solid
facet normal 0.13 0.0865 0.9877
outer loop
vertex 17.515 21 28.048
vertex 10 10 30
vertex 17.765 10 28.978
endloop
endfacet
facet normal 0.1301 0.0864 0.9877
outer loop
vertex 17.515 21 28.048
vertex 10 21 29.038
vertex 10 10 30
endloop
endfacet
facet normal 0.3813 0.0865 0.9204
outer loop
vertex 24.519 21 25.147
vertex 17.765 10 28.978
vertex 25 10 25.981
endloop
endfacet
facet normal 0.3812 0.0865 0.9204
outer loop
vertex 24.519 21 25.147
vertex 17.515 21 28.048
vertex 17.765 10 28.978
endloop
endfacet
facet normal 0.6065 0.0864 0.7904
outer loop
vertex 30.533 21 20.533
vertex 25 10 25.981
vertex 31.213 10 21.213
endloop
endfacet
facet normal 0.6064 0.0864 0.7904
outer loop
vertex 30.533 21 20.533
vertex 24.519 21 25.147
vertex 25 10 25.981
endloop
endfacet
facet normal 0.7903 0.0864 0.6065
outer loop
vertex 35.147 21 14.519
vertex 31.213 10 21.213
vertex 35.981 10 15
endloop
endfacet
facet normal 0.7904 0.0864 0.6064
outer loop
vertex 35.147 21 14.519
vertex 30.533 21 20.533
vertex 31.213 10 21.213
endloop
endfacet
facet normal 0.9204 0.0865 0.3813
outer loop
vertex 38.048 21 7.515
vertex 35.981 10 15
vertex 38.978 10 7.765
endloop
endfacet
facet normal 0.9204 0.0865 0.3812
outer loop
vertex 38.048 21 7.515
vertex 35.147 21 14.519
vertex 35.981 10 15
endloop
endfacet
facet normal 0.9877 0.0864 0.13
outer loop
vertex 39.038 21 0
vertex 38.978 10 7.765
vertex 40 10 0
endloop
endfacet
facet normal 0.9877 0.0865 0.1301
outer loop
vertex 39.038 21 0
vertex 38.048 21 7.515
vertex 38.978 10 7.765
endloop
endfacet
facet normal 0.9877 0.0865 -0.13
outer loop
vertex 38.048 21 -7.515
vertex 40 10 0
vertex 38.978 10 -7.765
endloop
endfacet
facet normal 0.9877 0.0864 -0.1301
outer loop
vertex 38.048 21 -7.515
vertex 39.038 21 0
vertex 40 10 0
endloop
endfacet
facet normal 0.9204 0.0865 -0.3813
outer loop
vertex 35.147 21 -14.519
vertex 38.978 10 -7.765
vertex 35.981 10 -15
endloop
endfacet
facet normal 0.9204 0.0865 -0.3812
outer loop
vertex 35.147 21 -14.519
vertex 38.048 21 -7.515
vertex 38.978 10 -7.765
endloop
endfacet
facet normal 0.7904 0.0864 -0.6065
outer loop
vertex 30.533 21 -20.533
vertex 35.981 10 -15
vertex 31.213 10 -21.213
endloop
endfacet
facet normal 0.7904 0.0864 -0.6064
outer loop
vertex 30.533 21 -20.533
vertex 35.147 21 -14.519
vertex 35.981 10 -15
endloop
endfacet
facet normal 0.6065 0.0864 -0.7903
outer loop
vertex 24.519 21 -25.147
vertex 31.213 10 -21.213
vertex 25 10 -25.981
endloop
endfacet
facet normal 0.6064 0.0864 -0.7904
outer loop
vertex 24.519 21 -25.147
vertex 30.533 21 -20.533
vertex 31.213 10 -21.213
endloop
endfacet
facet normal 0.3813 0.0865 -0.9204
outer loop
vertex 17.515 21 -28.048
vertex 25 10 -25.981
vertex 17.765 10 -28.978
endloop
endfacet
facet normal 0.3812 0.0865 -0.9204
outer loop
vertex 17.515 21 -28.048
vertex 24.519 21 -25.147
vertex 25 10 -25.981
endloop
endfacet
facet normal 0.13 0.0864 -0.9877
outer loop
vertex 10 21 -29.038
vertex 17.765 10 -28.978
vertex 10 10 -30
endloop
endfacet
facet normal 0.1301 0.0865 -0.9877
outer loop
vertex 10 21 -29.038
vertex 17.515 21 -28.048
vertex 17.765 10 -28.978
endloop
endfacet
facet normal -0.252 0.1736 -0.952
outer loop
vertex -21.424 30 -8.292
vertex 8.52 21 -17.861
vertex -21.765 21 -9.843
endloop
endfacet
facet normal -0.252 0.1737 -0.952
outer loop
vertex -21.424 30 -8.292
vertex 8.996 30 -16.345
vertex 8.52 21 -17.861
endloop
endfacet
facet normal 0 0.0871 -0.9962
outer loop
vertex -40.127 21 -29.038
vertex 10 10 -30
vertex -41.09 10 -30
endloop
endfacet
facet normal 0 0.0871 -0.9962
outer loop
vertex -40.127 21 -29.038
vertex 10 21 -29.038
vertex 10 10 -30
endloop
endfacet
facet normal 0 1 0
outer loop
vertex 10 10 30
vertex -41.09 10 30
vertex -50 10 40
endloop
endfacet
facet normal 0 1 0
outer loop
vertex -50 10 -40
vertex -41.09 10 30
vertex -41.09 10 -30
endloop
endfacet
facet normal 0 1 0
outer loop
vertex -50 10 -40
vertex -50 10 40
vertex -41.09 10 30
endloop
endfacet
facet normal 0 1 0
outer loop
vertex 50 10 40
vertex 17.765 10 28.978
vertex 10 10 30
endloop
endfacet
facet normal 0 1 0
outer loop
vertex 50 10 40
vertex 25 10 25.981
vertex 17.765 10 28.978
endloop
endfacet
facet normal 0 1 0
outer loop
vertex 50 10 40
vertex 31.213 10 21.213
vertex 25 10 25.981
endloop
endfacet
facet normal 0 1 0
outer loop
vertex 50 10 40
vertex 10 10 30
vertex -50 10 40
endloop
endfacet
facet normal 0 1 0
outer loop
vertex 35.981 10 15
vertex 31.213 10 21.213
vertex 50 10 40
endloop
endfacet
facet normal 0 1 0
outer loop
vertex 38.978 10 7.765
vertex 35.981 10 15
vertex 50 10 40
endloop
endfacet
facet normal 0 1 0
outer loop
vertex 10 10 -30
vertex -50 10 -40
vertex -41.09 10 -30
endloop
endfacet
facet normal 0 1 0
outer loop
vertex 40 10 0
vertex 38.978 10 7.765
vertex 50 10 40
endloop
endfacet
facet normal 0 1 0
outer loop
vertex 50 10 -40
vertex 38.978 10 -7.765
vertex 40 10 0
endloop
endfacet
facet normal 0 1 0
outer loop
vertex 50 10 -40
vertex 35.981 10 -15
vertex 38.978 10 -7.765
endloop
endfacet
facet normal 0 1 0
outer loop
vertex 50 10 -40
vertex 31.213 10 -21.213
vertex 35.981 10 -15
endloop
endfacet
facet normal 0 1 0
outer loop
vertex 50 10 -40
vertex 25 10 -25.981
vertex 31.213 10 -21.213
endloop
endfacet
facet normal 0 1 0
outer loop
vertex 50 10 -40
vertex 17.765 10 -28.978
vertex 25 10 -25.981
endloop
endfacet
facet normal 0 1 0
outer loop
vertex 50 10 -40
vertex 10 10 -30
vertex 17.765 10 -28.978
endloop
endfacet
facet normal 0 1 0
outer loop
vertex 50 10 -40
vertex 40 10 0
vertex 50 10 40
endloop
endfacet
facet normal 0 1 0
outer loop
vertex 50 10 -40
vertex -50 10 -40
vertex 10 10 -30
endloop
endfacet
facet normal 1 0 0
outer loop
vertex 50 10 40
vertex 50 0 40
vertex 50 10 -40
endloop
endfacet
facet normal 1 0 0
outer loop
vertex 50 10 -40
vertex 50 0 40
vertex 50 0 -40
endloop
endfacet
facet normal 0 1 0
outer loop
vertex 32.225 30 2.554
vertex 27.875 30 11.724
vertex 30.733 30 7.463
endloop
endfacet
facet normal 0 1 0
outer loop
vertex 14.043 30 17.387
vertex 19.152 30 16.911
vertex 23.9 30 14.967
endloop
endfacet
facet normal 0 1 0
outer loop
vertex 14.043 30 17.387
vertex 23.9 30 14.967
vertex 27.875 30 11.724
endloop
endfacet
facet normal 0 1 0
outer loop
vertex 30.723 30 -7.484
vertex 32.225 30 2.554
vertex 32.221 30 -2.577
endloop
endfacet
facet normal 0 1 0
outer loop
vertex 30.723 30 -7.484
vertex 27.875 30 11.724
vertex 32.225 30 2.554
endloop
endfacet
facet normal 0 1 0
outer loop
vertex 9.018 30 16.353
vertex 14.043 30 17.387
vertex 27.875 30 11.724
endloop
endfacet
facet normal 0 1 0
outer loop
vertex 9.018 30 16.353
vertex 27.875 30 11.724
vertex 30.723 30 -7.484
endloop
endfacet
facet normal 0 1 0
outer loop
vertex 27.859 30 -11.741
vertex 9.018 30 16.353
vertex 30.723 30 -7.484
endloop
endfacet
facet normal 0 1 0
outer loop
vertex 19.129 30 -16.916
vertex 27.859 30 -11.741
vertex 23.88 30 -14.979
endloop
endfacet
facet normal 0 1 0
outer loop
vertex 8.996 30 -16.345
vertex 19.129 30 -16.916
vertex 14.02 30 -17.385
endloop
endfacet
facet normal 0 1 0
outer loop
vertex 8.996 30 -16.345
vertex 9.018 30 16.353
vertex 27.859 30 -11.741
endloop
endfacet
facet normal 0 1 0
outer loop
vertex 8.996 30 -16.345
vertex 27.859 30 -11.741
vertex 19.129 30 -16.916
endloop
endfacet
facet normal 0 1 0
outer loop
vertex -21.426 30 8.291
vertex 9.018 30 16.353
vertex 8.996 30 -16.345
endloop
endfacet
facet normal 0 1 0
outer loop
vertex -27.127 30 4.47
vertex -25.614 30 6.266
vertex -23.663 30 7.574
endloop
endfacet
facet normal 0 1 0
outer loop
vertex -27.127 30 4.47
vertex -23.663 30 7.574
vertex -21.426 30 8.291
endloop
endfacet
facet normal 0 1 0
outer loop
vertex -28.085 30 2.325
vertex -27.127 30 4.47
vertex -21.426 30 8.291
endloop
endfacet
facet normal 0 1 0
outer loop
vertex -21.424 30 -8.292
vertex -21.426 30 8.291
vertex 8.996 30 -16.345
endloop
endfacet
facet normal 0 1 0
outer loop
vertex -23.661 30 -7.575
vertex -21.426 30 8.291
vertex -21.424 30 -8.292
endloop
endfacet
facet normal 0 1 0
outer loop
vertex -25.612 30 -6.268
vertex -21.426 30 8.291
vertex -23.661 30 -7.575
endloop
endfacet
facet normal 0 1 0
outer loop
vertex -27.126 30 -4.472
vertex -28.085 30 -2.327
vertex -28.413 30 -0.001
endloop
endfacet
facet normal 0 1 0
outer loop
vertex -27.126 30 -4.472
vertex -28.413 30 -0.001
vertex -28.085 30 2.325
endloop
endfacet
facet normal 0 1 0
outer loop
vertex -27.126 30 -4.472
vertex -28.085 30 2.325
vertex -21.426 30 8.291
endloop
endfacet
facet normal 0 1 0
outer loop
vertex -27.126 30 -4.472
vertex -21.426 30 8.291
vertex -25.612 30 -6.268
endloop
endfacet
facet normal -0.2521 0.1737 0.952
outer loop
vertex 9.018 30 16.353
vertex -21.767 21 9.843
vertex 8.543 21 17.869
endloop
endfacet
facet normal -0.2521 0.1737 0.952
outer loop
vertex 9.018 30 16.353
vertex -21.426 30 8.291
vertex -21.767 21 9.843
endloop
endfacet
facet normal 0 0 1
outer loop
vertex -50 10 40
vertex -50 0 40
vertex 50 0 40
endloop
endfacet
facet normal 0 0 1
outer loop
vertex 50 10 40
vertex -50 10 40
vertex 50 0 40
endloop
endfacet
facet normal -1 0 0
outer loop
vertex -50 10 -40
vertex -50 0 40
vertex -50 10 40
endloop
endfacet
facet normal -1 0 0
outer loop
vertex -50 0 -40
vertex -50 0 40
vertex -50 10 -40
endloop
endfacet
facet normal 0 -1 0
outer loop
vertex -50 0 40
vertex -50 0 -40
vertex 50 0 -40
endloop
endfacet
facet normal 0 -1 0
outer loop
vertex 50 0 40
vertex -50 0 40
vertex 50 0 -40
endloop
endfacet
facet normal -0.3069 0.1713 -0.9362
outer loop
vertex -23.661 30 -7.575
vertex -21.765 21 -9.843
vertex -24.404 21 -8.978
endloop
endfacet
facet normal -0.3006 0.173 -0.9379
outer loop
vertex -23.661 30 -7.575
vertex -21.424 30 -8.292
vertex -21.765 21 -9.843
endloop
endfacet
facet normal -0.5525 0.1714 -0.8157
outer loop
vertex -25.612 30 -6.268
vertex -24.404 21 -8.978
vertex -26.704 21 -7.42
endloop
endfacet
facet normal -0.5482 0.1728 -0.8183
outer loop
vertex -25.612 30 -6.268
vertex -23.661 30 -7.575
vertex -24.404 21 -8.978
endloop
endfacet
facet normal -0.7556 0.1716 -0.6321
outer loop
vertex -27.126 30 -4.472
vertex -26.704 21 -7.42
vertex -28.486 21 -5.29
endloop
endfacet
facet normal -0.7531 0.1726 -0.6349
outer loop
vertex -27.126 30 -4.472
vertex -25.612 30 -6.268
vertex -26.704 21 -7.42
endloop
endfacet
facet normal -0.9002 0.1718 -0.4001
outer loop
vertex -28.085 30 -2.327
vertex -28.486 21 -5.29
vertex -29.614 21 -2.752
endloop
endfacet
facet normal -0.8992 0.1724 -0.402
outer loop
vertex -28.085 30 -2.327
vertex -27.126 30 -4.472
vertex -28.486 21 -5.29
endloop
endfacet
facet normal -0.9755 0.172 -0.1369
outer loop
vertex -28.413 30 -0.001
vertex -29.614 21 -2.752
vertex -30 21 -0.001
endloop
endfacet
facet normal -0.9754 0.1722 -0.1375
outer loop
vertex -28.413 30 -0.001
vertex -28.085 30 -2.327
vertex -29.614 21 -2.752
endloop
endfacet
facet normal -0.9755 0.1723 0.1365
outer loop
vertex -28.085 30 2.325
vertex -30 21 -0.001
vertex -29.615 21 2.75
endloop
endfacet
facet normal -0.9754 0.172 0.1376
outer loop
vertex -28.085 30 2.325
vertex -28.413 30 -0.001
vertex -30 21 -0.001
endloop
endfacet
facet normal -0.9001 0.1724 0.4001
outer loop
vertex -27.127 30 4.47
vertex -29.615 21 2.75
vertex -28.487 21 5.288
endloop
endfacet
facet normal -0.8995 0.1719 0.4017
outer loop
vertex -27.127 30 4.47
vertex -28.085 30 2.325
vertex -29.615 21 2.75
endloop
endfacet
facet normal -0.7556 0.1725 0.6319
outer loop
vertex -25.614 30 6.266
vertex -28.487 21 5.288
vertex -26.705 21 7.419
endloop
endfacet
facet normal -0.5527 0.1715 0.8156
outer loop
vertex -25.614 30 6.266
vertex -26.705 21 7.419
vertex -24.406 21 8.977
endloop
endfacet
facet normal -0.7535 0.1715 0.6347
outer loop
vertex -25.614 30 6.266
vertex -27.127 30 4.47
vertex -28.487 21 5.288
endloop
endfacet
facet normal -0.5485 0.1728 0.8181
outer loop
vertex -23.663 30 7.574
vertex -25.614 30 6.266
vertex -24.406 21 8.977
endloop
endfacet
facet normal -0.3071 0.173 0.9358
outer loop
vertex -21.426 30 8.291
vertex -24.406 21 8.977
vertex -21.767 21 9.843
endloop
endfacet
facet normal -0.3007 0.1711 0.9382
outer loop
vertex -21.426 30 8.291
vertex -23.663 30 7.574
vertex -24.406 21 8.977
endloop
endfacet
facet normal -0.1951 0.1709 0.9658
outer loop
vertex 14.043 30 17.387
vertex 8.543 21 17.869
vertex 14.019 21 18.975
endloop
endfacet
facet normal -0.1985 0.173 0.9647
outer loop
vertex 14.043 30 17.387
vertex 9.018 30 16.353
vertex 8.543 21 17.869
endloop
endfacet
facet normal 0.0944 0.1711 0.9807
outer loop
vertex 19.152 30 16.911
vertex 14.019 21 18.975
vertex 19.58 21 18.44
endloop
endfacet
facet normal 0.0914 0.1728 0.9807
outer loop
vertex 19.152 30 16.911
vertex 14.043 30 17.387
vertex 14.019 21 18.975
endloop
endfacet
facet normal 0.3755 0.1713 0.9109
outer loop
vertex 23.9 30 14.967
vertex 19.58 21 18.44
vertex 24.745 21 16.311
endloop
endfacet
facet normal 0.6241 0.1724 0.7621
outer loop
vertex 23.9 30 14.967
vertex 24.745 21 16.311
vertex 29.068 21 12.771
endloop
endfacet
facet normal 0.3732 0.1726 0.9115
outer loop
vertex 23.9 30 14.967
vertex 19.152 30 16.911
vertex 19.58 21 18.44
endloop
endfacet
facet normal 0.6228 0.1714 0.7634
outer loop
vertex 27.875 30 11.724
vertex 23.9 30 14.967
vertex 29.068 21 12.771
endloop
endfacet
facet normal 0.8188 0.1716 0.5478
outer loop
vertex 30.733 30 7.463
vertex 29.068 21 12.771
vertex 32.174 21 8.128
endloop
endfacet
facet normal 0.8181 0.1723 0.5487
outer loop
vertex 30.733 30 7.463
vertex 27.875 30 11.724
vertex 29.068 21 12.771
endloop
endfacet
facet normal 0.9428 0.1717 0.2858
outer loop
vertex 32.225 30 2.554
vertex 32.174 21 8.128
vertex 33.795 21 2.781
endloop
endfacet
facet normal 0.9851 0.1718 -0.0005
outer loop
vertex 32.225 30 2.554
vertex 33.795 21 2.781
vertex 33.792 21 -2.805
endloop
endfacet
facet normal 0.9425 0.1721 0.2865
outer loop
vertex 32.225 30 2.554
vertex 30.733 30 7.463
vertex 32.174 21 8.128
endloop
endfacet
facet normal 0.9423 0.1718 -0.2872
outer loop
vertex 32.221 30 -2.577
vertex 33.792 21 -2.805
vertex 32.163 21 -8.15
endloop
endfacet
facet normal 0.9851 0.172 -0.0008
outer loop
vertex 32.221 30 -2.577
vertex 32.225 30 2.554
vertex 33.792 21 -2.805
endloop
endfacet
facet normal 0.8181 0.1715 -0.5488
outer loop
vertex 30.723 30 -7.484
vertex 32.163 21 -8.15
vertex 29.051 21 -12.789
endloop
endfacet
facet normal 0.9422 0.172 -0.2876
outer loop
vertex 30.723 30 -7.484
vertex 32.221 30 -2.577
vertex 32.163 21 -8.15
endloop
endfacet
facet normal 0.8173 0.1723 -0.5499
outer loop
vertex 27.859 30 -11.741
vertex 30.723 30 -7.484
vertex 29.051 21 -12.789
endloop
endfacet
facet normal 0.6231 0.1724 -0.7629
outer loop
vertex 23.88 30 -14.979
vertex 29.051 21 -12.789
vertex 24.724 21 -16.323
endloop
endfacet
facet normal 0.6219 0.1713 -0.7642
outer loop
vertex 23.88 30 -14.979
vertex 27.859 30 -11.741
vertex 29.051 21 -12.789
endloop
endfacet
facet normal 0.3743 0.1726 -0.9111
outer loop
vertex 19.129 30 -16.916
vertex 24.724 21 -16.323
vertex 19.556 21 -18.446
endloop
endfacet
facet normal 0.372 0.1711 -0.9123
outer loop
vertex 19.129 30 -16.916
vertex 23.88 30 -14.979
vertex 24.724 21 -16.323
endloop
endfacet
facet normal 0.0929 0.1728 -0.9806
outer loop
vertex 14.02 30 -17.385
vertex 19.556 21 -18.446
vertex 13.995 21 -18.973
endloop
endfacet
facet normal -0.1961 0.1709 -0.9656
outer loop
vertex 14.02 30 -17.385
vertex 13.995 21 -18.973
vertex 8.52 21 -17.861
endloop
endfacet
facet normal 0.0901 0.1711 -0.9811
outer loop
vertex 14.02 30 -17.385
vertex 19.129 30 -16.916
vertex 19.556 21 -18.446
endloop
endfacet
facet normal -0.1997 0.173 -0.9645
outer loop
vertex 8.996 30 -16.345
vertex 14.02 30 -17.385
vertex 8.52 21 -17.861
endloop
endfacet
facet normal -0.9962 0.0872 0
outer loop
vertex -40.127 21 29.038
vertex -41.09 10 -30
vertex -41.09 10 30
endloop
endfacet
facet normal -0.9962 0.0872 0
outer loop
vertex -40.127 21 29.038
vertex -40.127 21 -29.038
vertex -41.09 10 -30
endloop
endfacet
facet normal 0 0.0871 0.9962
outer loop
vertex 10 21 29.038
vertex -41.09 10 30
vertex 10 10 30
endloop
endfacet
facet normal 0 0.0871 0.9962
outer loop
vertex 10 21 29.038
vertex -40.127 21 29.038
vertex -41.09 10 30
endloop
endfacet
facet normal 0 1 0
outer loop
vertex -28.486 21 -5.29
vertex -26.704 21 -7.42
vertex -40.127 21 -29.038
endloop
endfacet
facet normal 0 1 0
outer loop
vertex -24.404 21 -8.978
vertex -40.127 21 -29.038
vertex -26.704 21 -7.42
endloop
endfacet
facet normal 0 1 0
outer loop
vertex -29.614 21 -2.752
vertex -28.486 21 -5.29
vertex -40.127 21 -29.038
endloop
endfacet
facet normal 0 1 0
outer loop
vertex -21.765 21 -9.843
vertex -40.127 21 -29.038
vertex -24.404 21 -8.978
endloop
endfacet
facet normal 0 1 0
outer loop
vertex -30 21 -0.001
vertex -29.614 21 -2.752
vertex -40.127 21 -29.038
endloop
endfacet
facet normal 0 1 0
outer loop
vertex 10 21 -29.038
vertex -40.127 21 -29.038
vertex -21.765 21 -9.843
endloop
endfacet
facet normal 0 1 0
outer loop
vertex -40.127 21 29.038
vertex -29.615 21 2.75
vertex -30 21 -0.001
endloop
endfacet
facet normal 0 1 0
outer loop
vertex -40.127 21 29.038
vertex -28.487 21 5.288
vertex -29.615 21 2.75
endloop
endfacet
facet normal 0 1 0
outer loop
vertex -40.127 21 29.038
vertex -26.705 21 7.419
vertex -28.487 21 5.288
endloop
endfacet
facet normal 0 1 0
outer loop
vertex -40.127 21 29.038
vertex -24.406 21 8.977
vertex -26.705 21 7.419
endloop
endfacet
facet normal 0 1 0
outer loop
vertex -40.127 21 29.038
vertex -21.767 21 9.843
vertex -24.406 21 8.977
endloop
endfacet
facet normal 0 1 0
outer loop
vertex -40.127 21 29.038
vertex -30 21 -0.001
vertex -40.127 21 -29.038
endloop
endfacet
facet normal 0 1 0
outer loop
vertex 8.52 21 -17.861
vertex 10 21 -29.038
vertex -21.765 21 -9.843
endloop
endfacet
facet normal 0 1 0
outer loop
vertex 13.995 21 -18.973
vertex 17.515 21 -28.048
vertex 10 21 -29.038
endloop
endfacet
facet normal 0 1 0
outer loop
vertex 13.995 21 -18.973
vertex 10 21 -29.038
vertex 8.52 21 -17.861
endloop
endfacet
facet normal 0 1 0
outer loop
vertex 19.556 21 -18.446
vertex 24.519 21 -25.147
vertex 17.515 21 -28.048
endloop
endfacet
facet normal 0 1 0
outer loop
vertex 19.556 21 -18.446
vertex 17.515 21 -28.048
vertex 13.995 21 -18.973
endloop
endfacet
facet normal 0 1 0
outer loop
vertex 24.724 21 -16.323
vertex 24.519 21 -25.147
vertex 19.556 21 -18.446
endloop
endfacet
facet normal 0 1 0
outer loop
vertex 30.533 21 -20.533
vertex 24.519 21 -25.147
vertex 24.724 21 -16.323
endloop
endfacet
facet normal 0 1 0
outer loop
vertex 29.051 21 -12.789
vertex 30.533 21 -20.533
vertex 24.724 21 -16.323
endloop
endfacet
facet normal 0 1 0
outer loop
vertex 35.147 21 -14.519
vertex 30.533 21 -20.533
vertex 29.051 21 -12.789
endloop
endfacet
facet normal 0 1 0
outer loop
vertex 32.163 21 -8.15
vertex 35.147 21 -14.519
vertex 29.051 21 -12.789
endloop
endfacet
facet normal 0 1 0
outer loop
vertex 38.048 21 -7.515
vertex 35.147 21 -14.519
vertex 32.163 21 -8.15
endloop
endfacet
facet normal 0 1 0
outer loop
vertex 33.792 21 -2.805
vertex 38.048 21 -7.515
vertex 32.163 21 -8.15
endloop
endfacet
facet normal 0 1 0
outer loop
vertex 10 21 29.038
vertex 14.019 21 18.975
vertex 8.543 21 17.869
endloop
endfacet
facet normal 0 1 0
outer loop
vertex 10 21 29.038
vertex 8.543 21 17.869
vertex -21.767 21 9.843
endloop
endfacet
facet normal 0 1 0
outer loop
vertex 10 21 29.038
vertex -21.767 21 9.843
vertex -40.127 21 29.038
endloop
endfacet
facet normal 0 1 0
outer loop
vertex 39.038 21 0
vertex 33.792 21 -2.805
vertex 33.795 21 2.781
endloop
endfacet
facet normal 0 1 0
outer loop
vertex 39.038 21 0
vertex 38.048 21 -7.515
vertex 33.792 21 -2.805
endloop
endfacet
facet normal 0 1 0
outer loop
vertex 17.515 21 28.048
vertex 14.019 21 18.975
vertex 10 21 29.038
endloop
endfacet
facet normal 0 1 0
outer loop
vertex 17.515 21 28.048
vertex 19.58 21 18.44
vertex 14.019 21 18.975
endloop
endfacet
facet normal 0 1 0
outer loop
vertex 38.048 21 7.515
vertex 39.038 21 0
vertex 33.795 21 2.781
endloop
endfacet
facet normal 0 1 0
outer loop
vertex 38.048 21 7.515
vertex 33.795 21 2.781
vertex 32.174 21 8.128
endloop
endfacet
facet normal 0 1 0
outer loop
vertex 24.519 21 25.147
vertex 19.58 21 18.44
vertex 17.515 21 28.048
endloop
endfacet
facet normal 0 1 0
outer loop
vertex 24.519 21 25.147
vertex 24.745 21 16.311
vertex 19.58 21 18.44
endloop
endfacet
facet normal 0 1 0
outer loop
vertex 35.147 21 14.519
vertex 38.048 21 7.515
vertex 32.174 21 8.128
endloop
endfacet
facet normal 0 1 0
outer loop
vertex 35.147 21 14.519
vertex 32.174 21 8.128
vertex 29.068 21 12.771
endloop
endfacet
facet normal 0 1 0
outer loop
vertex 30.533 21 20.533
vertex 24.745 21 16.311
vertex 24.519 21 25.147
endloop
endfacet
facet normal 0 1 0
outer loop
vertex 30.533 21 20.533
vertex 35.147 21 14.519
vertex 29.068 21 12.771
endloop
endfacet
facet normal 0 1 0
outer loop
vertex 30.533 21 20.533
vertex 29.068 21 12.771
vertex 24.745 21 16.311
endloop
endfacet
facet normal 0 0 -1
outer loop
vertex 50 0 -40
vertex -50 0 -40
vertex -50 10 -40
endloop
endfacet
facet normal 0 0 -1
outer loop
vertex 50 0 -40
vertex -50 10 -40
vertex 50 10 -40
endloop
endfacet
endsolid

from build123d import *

# Parameters (mm, degrees)
SKETCH_1_W      = 100
SKETCH_1_H      = 80
EXTRUDE_1_DEPTH = 10
EXTRUDE_2_DEPTH = 11
EXTRUDE_2_TAPER = 5
EXTRUDE_3_DEPTH = 9
EXTRUDE_3_TAPER = 10


with BuildPart() as part:
    # 스케치1 → 보스-돌출1 (new body)
    with BuildSketch(Plane(origin=(0, 0, 0), x_dir=(1, 0, 0), z_dir=(0, 1, 0))):
        Rectangle(SKETCH_1_W, SKETCH_1_H)
    extrude(amount=EXTRUDE_1_DEPTH)

    # 스케치2 → 보스-돌출2 (add)
    with BuildSketch(Plane(origin=(0, 10, 0), x_dir=(1, 0, 0), z_dir=(0, 1, 0))):
        with BuildLine():
            Line((10, 30), (-41.089791126, 30))
            Line((-41.089791126, 30), (-41.089791126, -30))
            Line((-41.089791126, -30), (10, -30))
            ThreePointArc((10, -30), (40, 0), (10, 30))
        make_face()
    extrude(amount=EXTRUDE_2_DEPTH, taper=EXTRUDE_2_TAPER)

    # 스케치4 → 보스-돌출3 (add)
    with BuildSketch(Plane(origin=(0, 21, 0), x_dir=(1, 0, 0), z_dir=(0, 1, 0))):
        with BuildLine():
            ThreePointArc((-21.764734991, 9.843053917), (-29.999999933, 0.001156755), (-21.767012144, -9.84264538))
            Line((-21.767012144, -9.84264538), (8.542741709, -17.869074273))
            ThreePointArc((8.542741709, -17.869074273), (33.999996077, 0.012209678), (8.51978119, 17.860760459))
            Line((8.51978119, 17.860760459), (-21.764734991, 9.843053917))
        make_face()
    extrude(amount=EXTRUDE_3_DEPTH, taper=EXTRUDE_3_TAPER)


solid = part.part
